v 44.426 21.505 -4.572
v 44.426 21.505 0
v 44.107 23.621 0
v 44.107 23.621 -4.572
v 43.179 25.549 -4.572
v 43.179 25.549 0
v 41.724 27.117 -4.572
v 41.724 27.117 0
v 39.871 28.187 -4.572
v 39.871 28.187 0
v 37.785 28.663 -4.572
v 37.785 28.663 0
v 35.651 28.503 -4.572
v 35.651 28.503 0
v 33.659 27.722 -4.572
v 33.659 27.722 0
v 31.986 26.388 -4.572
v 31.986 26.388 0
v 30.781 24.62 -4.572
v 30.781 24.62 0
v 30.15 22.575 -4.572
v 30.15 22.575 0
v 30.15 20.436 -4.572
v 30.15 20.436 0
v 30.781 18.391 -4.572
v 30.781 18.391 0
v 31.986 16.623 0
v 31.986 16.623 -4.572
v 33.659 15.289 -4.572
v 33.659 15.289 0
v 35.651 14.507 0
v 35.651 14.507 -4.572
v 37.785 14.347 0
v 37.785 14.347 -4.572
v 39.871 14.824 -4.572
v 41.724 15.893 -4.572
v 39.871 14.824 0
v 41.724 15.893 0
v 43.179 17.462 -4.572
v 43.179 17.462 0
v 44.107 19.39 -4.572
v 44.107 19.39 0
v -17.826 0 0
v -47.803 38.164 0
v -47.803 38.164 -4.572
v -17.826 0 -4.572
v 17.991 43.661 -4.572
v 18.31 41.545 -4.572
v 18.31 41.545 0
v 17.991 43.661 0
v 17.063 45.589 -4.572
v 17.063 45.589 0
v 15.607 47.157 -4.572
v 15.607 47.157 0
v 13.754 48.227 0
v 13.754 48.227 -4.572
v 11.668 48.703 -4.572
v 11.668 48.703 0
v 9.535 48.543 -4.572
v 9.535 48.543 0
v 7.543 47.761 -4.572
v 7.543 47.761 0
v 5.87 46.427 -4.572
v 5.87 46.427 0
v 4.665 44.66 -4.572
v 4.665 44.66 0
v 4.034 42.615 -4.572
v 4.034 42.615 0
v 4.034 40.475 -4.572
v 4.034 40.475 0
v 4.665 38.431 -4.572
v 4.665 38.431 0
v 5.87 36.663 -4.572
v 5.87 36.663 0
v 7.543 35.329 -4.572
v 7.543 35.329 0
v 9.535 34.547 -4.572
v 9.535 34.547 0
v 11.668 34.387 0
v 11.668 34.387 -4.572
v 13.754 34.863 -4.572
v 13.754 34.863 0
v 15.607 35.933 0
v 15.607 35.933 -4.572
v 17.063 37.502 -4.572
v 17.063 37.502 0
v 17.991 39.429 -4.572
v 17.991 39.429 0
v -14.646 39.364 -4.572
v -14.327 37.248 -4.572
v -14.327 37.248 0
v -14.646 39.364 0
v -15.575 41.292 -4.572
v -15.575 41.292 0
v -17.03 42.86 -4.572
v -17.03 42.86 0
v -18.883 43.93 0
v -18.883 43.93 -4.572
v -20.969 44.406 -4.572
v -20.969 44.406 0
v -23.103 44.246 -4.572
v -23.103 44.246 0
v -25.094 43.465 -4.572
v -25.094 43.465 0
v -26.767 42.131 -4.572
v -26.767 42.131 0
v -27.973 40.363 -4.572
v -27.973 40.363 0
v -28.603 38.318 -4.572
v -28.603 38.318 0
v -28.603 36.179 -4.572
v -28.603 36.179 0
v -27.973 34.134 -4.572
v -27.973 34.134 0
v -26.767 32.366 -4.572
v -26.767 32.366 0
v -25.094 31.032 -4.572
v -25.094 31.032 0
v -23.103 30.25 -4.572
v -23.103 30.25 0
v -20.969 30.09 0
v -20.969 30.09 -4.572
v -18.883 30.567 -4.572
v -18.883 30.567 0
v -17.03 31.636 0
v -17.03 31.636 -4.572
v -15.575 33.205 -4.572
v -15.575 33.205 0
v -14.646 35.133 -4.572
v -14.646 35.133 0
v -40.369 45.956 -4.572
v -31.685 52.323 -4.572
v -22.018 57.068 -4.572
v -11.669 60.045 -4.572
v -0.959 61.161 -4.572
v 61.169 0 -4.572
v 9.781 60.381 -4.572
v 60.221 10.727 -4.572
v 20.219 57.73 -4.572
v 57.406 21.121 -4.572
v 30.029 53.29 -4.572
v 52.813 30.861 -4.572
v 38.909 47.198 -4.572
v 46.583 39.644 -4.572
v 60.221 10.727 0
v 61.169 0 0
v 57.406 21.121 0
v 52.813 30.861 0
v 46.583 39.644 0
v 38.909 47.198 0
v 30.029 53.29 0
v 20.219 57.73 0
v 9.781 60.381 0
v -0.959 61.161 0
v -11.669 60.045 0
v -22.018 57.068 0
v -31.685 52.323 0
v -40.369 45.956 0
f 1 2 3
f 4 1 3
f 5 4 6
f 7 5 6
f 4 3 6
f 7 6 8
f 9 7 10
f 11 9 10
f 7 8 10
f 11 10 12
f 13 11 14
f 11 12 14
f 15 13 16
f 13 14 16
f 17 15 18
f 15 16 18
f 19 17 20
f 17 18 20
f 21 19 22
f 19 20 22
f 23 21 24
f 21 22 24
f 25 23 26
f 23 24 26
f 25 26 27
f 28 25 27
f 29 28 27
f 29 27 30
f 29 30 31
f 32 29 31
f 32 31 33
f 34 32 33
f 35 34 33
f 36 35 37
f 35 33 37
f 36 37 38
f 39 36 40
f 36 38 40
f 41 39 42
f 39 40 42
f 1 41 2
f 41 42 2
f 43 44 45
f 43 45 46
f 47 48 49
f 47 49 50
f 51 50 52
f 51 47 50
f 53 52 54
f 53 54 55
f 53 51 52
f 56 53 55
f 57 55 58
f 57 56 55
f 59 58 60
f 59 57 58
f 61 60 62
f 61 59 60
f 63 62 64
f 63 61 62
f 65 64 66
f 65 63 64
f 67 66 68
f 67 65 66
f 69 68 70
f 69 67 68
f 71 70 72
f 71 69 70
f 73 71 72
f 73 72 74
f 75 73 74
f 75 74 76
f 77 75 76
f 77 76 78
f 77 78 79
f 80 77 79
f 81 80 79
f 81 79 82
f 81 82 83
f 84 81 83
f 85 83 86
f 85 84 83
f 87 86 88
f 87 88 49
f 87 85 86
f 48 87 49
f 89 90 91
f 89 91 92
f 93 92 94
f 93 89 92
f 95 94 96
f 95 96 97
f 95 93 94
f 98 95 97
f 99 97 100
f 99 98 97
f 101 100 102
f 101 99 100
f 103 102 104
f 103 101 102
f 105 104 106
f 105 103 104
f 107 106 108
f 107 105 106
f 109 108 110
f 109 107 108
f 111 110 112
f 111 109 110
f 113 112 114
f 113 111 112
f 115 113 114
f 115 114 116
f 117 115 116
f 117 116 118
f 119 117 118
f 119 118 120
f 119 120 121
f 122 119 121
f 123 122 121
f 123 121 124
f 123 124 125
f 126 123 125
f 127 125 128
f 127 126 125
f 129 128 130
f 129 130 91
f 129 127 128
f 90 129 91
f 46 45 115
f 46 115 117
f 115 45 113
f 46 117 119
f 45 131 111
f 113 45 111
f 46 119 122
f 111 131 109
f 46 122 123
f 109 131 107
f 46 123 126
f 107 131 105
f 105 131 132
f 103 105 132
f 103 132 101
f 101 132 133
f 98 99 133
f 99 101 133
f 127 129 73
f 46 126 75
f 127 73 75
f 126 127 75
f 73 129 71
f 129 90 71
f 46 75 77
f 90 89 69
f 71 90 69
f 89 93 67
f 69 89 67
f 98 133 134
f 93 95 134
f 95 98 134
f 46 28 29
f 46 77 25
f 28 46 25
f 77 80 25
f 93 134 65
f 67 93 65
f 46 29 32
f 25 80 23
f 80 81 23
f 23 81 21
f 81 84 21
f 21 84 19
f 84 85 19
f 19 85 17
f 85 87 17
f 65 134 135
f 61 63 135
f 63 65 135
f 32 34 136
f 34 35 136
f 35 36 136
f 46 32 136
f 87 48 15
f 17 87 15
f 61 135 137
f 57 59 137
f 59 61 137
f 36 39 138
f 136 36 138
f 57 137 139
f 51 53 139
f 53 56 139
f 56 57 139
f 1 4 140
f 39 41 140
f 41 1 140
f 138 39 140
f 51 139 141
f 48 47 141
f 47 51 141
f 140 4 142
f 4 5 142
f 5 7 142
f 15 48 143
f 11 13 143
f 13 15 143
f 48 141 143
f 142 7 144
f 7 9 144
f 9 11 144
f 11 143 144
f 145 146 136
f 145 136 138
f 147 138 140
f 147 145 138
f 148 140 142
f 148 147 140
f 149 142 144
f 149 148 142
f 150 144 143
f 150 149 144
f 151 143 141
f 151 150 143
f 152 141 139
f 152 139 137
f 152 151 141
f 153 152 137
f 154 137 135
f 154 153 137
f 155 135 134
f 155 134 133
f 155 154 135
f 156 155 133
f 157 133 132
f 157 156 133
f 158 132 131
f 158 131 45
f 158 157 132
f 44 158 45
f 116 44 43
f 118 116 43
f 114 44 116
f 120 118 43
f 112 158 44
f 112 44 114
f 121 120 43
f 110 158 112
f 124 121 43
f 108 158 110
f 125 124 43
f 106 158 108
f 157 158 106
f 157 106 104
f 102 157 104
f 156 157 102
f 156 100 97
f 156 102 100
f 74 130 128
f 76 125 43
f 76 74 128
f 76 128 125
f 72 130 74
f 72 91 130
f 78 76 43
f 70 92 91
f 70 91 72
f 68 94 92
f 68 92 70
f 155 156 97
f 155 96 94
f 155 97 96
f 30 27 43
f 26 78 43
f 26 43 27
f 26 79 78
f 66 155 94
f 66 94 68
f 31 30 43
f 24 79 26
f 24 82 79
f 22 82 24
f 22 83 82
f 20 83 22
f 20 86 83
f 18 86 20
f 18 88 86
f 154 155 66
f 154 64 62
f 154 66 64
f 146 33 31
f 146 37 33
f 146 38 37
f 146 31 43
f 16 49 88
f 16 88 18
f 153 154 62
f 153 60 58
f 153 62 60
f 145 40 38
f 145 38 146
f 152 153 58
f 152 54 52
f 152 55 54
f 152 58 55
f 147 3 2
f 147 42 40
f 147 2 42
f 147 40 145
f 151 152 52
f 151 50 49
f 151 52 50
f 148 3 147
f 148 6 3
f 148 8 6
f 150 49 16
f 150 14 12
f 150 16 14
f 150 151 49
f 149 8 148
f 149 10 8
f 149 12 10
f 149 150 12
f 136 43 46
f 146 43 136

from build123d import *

# Parameters (mm, degrees)
SKETCH1_R             = 7.178016374
EXTRUDE1_DEPTH        = 4.572
CIRPATTERN3_START     = -4.572
CIRPATTERN3_OUTLINE_R = 7.178016374
CIRPATTERN3_DEPTH     = 4.572


# Read off the part's stored shape, not the designer's step: CirPattern3
with BuildPart() as part:
    # Sketch1 → Extrude1 (new body)
    with BuildSketch(Plane.XY):
        with BuildLine():
            Line((-17.82605161, 0), (61.168535359, 0))
            ThreePointArc((61.168535359, 0), (20.218554782, 57.730405857), (-47.802514574, 38.164241357))
            Line((-47.802514574, 38.164241357), (-17.82605161, 0))
        make_face()
        with Locations((37.24834288, 21.505340789)):
            Circle(SKETCH1_R, mode=Mode.SUBTRACT)
    extrude(amount=-EXTRUDE1_DEPTH)

    # CirPattern3 outline → CirPattern3 (cut)
    with BuildSketch(Plane.XY.offset(CIRPATTERN3_START)):
        with Locations((-21.505340789, 37.24834288)):
            Circle(CIRPATTERN3_OUTLINE_R)
        with Locations((11.131983535, 41.545128142)):
            Circle(CIRPATTERN3_OUTLINE_R)
    extrude(amount=CIRPATTERN3_DEPTH, mode=Mode.SUBTRACT)


solid = part.part
